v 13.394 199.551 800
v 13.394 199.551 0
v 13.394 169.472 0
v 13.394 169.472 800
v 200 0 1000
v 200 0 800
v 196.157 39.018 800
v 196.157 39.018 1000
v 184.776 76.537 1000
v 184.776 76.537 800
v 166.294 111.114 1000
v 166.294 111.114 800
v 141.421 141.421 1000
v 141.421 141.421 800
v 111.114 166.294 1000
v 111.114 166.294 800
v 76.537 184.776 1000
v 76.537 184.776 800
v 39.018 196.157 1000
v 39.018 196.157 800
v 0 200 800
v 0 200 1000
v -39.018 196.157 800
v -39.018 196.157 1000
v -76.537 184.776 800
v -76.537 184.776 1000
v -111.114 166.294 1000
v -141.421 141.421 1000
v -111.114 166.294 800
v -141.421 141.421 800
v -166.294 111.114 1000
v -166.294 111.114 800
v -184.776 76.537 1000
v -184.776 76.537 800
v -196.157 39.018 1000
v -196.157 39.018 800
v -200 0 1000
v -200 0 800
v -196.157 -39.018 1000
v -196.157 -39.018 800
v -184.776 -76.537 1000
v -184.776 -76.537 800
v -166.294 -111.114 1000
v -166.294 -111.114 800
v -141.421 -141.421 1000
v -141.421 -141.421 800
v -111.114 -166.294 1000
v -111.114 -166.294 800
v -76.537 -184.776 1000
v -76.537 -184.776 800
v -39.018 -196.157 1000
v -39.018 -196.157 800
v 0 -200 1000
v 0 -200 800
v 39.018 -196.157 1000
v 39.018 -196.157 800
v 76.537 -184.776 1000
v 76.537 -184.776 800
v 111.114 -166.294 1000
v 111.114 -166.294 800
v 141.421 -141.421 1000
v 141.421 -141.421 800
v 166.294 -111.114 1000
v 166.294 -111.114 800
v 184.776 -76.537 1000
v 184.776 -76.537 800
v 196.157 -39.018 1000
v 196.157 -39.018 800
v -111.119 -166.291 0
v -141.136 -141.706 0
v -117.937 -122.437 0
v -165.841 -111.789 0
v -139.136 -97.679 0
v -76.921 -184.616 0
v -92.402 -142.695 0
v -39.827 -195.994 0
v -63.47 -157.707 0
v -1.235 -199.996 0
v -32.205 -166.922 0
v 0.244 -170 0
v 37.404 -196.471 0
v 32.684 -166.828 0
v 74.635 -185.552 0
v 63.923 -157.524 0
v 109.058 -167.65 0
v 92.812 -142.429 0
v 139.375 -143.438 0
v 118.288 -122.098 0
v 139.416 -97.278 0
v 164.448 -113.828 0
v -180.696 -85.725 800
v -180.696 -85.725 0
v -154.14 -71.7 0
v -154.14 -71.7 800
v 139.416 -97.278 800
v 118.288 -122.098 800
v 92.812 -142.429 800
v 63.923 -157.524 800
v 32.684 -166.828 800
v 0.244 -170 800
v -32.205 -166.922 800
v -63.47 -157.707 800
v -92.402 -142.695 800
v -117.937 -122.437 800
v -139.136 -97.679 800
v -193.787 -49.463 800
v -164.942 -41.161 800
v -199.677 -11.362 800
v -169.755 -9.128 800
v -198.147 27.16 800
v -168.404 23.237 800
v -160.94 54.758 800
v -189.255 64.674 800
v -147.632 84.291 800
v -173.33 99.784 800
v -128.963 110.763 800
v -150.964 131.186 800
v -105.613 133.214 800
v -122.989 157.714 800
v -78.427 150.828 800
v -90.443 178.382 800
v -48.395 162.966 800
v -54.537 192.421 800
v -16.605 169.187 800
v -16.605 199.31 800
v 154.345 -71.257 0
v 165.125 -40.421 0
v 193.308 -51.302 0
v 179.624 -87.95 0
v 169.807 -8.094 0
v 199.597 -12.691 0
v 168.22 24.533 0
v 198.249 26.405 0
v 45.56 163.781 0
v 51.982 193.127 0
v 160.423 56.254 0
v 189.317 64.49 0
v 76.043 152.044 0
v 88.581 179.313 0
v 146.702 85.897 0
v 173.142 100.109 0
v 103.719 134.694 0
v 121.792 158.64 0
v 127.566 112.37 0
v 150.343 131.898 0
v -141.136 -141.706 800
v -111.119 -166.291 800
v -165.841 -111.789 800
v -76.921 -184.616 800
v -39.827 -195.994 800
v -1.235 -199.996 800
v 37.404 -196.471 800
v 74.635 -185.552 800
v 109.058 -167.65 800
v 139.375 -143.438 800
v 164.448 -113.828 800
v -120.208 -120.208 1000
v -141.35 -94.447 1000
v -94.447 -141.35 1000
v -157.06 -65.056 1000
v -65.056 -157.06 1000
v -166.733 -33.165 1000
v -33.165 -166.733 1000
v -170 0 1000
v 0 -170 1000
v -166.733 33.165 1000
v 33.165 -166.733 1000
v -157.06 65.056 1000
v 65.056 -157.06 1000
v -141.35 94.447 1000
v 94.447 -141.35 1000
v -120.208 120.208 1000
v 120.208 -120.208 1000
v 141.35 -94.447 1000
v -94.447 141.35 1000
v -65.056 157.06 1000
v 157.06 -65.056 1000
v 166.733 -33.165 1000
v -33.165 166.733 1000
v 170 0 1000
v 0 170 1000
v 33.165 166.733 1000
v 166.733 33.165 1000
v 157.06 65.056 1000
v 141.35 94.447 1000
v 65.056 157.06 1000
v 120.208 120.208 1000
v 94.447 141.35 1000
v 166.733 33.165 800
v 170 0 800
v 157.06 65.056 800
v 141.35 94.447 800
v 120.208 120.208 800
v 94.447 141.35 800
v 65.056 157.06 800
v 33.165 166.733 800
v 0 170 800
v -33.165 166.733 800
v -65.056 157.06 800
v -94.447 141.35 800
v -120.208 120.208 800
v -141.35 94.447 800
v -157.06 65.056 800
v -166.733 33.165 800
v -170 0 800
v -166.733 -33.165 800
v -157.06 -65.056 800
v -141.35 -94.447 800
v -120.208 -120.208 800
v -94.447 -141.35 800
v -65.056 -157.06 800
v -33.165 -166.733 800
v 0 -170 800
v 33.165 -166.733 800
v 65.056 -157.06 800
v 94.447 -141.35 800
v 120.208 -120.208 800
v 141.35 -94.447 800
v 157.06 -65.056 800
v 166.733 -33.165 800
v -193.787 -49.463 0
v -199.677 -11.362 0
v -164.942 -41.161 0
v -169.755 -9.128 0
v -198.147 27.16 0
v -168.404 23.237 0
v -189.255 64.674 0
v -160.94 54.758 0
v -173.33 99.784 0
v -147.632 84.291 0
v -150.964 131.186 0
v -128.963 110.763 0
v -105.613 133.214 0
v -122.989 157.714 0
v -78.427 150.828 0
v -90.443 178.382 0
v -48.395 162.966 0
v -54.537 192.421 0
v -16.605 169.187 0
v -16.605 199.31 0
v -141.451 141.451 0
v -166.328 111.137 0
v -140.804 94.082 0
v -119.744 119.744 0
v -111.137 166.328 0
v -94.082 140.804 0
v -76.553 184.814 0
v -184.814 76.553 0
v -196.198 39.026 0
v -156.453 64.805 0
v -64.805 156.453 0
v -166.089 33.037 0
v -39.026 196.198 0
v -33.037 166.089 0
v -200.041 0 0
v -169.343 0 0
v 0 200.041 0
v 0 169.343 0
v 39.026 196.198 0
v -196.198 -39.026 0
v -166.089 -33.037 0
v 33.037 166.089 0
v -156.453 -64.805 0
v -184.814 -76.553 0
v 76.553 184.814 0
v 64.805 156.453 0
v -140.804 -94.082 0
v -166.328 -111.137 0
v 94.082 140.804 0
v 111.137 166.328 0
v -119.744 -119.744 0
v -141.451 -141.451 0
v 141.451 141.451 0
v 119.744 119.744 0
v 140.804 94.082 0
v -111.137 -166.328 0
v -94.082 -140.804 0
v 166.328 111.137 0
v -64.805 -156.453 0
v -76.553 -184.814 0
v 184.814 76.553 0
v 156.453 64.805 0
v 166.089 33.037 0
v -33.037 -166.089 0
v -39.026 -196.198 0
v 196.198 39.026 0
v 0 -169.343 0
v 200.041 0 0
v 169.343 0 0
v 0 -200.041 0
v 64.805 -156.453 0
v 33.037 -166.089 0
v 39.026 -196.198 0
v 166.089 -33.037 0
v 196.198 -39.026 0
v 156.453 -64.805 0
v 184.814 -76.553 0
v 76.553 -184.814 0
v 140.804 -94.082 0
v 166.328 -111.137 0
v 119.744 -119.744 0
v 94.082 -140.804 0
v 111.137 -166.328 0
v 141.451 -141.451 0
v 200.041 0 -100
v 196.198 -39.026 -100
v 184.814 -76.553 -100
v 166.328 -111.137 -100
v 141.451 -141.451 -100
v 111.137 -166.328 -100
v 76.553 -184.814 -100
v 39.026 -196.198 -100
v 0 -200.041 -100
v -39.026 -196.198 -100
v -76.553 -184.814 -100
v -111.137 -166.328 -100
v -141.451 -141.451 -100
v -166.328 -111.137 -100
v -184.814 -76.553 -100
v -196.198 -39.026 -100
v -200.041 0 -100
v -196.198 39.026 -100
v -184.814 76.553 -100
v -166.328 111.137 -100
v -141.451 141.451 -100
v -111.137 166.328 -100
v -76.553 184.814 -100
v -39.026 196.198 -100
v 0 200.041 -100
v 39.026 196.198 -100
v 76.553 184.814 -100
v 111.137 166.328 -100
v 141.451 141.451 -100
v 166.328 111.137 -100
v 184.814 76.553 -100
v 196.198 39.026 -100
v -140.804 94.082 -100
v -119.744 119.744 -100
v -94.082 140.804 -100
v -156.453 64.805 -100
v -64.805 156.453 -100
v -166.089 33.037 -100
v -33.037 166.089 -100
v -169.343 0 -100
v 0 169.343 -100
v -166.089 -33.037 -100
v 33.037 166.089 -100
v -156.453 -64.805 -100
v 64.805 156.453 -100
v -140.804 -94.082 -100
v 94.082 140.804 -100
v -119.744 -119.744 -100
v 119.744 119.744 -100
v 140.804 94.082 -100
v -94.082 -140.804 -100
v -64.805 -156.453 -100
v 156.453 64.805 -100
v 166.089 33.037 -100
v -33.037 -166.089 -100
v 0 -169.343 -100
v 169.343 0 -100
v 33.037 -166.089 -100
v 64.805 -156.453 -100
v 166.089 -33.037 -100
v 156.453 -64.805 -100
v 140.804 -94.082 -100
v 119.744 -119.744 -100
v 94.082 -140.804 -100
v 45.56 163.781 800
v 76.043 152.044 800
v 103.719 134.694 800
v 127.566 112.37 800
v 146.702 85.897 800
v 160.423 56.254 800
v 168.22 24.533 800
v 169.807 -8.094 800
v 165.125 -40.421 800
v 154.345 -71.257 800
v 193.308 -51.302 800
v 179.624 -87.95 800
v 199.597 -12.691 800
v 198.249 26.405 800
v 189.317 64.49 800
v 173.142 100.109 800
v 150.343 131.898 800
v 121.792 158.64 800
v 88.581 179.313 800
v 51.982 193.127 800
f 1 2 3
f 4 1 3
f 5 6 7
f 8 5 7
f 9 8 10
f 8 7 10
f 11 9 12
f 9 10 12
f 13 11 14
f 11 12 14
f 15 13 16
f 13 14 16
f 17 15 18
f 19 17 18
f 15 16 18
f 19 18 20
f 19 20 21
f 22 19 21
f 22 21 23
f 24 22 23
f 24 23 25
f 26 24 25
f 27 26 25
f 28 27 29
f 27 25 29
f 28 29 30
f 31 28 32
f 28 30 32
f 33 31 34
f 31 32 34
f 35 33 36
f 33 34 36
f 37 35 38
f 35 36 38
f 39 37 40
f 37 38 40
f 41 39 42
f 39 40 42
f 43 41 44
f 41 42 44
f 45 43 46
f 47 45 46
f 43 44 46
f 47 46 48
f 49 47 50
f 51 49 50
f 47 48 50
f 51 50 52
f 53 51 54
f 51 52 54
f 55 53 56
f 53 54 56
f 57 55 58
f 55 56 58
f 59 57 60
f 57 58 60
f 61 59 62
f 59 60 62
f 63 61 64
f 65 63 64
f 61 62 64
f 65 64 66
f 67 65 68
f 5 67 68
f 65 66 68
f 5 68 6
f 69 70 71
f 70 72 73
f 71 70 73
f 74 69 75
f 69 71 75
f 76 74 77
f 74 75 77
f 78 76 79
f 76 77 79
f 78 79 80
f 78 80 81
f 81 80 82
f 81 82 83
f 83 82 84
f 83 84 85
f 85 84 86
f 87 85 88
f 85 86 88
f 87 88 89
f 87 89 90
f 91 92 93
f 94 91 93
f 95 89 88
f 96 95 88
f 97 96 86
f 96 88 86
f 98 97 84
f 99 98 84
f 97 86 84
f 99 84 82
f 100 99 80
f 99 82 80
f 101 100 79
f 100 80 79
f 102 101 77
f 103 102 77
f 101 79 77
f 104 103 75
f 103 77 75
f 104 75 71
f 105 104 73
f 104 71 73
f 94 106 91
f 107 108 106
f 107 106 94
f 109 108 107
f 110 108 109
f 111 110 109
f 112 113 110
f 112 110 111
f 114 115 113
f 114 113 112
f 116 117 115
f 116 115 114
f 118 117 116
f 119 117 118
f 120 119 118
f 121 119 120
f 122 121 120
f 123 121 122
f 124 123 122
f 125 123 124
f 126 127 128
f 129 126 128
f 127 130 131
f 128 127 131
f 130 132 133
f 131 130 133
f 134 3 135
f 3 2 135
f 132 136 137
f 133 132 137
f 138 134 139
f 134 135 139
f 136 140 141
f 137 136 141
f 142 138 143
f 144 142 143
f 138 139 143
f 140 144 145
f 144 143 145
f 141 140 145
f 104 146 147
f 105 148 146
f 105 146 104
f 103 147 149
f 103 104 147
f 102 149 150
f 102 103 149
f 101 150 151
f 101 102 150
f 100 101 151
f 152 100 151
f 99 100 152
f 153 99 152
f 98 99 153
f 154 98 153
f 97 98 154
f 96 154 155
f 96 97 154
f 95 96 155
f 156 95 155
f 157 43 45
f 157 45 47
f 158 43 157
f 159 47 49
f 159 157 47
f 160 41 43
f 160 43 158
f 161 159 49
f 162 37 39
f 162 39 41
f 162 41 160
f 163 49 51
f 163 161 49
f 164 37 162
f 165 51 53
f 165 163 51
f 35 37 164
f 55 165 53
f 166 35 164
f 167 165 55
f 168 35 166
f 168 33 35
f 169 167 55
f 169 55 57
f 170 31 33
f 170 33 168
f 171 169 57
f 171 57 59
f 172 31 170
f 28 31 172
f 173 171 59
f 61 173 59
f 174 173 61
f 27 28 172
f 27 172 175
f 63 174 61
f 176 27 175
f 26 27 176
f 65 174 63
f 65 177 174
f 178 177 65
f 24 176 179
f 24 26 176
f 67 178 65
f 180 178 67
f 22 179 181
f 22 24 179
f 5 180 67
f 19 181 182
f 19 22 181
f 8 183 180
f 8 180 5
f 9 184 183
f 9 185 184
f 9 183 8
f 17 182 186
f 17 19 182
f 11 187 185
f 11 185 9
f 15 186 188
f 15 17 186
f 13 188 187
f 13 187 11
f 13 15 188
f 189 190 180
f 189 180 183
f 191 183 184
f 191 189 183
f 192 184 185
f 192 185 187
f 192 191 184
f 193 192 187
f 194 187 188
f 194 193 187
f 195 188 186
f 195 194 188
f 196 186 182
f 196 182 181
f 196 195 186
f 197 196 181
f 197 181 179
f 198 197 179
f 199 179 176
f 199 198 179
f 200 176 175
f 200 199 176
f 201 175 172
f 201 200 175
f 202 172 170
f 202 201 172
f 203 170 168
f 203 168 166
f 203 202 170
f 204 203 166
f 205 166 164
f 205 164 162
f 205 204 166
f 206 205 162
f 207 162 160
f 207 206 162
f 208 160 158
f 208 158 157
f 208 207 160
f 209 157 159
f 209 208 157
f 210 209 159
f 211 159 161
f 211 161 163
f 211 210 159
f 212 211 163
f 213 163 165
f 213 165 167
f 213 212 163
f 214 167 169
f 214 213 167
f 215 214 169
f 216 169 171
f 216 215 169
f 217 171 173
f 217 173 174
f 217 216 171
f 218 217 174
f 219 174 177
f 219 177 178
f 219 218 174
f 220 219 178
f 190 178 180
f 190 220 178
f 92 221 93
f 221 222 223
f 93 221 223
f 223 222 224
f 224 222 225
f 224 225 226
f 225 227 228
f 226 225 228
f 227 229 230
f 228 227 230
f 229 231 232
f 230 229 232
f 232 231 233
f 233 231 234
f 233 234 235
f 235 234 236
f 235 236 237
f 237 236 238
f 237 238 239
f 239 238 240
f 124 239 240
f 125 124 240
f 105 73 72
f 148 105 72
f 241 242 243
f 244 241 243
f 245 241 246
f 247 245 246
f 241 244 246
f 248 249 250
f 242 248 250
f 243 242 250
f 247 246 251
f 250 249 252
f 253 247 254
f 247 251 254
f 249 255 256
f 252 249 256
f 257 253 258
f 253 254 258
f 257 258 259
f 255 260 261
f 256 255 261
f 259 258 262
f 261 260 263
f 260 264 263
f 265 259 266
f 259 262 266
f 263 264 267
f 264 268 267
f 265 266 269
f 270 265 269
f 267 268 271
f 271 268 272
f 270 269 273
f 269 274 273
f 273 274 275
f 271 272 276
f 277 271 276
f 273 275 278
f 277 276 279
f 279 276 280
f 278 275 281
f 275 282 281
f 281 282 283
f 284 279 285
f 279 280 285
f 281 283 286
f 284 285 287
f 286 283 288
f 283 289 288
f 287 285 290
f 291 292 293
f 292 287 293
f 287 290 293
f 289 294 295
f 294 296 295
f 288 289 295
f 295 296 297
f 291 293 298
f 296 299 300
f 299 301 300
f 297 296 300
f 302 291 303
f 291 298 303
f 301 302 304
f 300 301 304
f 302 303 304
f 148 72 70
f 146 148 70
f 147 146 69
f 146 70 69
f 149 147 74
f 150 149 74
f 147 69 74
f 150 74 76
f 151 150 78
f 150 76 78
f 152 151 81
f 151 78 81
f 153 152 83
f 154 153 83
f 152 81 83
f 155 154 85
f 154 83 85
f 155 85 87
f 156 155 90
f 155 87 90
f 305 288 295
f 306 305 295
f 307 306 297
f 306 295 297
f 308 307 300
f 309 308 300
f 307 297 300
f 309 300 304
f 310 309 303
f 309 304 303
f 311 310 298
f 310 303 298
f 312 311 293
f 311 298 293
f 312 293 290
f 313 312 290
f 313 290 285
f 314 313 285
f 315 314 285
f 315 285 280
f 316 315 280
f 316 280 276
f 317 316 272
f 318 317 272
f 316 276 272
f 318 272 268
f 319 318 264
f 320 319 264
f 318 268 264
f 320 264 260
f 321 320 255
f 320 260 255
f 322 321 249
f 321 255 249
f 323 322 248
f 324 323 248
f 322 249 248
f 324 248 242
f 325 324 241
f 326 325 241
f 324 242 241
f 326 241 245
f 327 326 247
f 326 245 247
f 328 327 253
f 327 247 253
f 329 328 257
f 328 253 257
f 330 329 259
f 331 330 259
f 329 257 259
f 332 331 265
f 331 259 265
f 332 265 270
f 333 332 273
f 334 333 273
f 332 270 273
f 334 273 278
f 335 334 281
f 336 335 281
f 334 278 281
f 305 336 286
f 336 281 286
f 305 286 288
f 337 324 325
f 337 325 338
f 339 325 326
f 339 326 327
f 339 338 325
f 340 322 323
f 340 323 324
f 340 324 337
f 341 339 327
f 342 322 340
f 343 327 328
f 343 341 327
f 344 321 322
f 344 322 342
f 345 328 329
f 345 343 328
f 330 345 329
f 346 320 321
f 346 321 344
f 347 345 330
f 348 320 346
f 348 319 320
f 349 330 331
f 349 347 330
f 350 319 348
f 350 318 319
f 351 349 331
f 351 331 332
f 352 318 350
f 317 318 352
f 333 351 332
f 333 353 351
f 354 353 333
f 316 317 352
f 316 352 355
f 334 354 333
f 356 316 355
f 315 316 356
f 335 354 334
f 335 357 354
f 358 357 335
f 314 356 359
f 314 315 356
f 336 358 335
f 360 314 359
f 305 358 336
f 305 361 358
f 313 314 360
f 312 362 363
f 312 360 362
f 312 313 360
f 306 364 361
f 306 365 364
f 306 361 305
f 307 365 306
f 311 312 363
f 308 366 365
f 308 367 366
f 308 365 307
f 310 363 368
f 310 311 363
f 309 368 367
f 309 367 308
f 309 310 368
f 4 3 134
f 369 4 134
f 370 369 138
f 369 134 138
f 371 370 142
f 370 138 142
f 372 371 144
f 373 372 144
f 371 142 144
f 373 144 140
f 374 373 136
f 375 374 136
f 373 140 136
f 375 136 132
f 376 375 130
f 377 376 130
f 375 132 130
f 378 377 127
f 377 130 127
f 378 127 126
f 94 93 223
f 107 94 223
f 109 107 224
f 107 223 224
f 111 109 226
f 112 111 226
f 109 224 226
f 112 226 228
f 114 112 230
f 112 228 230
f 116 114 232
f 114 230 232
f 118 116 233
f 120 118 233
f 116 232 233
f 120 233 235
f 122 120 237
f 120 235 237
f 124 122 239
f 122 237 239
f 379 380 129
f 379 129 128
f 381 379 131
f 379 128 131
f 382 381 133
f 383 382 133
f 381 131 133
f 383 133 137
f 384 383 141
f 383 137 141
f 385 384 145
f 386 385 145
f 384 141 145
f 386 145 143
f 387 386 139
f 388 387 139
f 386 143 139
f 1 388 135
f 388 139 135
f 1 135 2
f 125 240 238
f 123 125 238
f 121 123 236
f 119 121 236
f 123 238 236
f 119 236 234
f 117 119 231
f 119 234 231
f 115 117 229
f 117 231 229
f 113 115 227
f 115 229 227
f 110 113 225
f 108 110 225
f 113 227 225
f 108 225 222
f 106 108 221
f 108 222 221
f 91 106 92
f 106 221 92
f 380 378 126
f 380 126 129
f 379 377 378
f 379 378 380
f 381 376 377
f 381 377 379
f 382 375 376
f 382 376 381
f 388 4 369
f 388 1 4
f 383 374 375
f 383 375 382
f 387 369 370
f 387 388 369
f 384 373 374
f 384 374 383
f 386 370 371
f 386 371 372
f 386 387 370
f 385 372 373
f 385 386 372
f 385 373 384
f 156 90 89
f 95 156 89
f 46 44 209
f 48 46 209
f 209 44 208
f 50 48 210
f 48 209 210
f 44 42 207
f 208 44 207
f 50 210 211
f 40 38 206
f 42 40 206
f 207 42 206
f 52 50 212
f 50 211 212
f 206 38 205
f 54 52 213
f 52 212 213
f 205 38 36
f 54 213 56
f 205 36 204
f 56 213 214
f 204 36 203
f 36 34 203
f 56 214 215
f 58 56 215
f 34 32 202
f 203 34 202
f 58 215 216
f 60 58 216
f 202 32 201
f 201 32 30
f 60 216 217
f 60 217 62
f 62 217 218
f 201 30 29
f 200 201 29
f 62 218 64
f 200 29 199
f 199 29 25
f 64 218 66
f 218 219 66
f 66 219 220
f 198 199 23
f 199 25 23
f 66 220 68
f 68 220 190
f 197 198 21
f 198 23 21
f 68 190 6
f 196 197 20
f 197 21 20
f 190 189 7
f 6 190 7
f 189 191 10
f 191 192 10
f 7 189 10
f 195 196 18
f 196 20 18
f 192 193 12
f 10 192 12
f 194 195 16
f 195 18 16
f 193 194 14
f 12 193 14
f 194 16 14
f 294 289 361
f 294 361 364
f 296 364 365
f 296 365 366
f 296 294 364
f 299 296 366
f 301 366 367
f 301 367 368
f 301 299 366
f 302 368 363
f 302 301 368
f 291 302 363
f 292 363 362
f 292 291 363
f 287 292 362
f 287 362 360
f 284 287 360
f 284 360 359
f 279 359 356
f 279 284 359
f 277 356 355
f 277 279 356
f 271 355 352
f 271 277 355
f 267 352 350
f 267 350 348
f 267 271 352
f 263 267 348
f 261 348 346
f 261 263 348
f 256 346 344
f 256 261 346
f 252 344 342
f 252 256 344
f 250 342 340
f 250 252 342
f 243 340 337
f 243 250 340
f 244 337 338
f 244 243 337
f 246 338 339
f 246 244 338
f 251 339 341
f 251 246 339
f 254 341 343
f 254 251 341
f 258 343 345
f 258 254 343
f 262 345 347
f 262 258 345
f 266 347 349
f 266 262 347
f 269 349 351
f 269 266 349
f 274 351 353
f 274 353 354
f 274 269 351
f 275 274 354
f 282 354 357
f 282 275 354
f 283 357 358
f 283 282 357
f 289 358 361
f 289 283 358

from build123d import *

# Parameters (mm, degrees)
F1_DEPTH = 800
F2_R     = 200
F2_R_2   = 170
F3_DEPTH = 200
F4_R     = 200.041422
F4_R_2   = 169.343147
F5_DEPTH = 100


with BuildPart() as f1:
    # F0 (on Top) → F1 (new body)
    with BuildSketch(Plane.XY):
        with BuildLine():
            Line((-16.604789, 169.187118), (-16.604789, 199.309511))
            ThreePointArc((-16.604789, 199.309511), (-173.329602, 99.784013), (-180.696333, -85.725348))
            Line((-180.696333, -85.725348), (-154.13992, -71.699967))
            ThreePointArc((-154.13992, -71.699967), (-147.631588, 84.290653), (-16.604789, 169.187118))
        make_face()
        with BuildLine():
            ThreePointArc((13.393863, 169.471545), (146.702489, 85.897495), (154.3454, -71.256562))
            Line((154.3454, -71.256562), (179.624132, -87.949822))
            ThreePointArc((179.624132, -87.949822), (173.142046, 100.109099), (13.393863, 199.551007))
            Line((13.393863, 199.551007), (13.393863, 169.471545))
        make_face()
        with BuildLine():
            ThreePointArc((139.416456, -97.278219), (0.244351, -169.999824), (-139.136232, -97.6786))
            Line((-139.136232, -97.6786), (-165.840914, -111.789049))
            ThreePointArc((-165.840914, -111.789049), (-1.234696, -199.996189), (164.448044, -113.82812))
            Line((164.448044, -113.82812), (139.416456, -97.278219))
        make_face()
    extrude(amount=F1_DEPTH)


with BuildPart() as f3:
    # F2 (on face) → F3 (new body)
    with BuildSketch(Plane.XY.offset(800)):
        Circle(F2_R)
        Circle(F2_R_2, mode=Mode.SUBTRACT)
    extrude(amount=F3_DEPTH)


with BuildPart() as f5:
    # F4 (on face) → F5 (new body)
    with BuildSketch(Plane(origin=(0, 0, 0), x_dir=(1, 0, 0), z_dir=(0, 0, -1))):
        Circle(F4_R)
        Circle(F4_R_2, mode=Mode.SUBTRACT)
    extrude(amount=F5_DEPTH)


solid = Compound([f1.part, f3.part, f5.part])
